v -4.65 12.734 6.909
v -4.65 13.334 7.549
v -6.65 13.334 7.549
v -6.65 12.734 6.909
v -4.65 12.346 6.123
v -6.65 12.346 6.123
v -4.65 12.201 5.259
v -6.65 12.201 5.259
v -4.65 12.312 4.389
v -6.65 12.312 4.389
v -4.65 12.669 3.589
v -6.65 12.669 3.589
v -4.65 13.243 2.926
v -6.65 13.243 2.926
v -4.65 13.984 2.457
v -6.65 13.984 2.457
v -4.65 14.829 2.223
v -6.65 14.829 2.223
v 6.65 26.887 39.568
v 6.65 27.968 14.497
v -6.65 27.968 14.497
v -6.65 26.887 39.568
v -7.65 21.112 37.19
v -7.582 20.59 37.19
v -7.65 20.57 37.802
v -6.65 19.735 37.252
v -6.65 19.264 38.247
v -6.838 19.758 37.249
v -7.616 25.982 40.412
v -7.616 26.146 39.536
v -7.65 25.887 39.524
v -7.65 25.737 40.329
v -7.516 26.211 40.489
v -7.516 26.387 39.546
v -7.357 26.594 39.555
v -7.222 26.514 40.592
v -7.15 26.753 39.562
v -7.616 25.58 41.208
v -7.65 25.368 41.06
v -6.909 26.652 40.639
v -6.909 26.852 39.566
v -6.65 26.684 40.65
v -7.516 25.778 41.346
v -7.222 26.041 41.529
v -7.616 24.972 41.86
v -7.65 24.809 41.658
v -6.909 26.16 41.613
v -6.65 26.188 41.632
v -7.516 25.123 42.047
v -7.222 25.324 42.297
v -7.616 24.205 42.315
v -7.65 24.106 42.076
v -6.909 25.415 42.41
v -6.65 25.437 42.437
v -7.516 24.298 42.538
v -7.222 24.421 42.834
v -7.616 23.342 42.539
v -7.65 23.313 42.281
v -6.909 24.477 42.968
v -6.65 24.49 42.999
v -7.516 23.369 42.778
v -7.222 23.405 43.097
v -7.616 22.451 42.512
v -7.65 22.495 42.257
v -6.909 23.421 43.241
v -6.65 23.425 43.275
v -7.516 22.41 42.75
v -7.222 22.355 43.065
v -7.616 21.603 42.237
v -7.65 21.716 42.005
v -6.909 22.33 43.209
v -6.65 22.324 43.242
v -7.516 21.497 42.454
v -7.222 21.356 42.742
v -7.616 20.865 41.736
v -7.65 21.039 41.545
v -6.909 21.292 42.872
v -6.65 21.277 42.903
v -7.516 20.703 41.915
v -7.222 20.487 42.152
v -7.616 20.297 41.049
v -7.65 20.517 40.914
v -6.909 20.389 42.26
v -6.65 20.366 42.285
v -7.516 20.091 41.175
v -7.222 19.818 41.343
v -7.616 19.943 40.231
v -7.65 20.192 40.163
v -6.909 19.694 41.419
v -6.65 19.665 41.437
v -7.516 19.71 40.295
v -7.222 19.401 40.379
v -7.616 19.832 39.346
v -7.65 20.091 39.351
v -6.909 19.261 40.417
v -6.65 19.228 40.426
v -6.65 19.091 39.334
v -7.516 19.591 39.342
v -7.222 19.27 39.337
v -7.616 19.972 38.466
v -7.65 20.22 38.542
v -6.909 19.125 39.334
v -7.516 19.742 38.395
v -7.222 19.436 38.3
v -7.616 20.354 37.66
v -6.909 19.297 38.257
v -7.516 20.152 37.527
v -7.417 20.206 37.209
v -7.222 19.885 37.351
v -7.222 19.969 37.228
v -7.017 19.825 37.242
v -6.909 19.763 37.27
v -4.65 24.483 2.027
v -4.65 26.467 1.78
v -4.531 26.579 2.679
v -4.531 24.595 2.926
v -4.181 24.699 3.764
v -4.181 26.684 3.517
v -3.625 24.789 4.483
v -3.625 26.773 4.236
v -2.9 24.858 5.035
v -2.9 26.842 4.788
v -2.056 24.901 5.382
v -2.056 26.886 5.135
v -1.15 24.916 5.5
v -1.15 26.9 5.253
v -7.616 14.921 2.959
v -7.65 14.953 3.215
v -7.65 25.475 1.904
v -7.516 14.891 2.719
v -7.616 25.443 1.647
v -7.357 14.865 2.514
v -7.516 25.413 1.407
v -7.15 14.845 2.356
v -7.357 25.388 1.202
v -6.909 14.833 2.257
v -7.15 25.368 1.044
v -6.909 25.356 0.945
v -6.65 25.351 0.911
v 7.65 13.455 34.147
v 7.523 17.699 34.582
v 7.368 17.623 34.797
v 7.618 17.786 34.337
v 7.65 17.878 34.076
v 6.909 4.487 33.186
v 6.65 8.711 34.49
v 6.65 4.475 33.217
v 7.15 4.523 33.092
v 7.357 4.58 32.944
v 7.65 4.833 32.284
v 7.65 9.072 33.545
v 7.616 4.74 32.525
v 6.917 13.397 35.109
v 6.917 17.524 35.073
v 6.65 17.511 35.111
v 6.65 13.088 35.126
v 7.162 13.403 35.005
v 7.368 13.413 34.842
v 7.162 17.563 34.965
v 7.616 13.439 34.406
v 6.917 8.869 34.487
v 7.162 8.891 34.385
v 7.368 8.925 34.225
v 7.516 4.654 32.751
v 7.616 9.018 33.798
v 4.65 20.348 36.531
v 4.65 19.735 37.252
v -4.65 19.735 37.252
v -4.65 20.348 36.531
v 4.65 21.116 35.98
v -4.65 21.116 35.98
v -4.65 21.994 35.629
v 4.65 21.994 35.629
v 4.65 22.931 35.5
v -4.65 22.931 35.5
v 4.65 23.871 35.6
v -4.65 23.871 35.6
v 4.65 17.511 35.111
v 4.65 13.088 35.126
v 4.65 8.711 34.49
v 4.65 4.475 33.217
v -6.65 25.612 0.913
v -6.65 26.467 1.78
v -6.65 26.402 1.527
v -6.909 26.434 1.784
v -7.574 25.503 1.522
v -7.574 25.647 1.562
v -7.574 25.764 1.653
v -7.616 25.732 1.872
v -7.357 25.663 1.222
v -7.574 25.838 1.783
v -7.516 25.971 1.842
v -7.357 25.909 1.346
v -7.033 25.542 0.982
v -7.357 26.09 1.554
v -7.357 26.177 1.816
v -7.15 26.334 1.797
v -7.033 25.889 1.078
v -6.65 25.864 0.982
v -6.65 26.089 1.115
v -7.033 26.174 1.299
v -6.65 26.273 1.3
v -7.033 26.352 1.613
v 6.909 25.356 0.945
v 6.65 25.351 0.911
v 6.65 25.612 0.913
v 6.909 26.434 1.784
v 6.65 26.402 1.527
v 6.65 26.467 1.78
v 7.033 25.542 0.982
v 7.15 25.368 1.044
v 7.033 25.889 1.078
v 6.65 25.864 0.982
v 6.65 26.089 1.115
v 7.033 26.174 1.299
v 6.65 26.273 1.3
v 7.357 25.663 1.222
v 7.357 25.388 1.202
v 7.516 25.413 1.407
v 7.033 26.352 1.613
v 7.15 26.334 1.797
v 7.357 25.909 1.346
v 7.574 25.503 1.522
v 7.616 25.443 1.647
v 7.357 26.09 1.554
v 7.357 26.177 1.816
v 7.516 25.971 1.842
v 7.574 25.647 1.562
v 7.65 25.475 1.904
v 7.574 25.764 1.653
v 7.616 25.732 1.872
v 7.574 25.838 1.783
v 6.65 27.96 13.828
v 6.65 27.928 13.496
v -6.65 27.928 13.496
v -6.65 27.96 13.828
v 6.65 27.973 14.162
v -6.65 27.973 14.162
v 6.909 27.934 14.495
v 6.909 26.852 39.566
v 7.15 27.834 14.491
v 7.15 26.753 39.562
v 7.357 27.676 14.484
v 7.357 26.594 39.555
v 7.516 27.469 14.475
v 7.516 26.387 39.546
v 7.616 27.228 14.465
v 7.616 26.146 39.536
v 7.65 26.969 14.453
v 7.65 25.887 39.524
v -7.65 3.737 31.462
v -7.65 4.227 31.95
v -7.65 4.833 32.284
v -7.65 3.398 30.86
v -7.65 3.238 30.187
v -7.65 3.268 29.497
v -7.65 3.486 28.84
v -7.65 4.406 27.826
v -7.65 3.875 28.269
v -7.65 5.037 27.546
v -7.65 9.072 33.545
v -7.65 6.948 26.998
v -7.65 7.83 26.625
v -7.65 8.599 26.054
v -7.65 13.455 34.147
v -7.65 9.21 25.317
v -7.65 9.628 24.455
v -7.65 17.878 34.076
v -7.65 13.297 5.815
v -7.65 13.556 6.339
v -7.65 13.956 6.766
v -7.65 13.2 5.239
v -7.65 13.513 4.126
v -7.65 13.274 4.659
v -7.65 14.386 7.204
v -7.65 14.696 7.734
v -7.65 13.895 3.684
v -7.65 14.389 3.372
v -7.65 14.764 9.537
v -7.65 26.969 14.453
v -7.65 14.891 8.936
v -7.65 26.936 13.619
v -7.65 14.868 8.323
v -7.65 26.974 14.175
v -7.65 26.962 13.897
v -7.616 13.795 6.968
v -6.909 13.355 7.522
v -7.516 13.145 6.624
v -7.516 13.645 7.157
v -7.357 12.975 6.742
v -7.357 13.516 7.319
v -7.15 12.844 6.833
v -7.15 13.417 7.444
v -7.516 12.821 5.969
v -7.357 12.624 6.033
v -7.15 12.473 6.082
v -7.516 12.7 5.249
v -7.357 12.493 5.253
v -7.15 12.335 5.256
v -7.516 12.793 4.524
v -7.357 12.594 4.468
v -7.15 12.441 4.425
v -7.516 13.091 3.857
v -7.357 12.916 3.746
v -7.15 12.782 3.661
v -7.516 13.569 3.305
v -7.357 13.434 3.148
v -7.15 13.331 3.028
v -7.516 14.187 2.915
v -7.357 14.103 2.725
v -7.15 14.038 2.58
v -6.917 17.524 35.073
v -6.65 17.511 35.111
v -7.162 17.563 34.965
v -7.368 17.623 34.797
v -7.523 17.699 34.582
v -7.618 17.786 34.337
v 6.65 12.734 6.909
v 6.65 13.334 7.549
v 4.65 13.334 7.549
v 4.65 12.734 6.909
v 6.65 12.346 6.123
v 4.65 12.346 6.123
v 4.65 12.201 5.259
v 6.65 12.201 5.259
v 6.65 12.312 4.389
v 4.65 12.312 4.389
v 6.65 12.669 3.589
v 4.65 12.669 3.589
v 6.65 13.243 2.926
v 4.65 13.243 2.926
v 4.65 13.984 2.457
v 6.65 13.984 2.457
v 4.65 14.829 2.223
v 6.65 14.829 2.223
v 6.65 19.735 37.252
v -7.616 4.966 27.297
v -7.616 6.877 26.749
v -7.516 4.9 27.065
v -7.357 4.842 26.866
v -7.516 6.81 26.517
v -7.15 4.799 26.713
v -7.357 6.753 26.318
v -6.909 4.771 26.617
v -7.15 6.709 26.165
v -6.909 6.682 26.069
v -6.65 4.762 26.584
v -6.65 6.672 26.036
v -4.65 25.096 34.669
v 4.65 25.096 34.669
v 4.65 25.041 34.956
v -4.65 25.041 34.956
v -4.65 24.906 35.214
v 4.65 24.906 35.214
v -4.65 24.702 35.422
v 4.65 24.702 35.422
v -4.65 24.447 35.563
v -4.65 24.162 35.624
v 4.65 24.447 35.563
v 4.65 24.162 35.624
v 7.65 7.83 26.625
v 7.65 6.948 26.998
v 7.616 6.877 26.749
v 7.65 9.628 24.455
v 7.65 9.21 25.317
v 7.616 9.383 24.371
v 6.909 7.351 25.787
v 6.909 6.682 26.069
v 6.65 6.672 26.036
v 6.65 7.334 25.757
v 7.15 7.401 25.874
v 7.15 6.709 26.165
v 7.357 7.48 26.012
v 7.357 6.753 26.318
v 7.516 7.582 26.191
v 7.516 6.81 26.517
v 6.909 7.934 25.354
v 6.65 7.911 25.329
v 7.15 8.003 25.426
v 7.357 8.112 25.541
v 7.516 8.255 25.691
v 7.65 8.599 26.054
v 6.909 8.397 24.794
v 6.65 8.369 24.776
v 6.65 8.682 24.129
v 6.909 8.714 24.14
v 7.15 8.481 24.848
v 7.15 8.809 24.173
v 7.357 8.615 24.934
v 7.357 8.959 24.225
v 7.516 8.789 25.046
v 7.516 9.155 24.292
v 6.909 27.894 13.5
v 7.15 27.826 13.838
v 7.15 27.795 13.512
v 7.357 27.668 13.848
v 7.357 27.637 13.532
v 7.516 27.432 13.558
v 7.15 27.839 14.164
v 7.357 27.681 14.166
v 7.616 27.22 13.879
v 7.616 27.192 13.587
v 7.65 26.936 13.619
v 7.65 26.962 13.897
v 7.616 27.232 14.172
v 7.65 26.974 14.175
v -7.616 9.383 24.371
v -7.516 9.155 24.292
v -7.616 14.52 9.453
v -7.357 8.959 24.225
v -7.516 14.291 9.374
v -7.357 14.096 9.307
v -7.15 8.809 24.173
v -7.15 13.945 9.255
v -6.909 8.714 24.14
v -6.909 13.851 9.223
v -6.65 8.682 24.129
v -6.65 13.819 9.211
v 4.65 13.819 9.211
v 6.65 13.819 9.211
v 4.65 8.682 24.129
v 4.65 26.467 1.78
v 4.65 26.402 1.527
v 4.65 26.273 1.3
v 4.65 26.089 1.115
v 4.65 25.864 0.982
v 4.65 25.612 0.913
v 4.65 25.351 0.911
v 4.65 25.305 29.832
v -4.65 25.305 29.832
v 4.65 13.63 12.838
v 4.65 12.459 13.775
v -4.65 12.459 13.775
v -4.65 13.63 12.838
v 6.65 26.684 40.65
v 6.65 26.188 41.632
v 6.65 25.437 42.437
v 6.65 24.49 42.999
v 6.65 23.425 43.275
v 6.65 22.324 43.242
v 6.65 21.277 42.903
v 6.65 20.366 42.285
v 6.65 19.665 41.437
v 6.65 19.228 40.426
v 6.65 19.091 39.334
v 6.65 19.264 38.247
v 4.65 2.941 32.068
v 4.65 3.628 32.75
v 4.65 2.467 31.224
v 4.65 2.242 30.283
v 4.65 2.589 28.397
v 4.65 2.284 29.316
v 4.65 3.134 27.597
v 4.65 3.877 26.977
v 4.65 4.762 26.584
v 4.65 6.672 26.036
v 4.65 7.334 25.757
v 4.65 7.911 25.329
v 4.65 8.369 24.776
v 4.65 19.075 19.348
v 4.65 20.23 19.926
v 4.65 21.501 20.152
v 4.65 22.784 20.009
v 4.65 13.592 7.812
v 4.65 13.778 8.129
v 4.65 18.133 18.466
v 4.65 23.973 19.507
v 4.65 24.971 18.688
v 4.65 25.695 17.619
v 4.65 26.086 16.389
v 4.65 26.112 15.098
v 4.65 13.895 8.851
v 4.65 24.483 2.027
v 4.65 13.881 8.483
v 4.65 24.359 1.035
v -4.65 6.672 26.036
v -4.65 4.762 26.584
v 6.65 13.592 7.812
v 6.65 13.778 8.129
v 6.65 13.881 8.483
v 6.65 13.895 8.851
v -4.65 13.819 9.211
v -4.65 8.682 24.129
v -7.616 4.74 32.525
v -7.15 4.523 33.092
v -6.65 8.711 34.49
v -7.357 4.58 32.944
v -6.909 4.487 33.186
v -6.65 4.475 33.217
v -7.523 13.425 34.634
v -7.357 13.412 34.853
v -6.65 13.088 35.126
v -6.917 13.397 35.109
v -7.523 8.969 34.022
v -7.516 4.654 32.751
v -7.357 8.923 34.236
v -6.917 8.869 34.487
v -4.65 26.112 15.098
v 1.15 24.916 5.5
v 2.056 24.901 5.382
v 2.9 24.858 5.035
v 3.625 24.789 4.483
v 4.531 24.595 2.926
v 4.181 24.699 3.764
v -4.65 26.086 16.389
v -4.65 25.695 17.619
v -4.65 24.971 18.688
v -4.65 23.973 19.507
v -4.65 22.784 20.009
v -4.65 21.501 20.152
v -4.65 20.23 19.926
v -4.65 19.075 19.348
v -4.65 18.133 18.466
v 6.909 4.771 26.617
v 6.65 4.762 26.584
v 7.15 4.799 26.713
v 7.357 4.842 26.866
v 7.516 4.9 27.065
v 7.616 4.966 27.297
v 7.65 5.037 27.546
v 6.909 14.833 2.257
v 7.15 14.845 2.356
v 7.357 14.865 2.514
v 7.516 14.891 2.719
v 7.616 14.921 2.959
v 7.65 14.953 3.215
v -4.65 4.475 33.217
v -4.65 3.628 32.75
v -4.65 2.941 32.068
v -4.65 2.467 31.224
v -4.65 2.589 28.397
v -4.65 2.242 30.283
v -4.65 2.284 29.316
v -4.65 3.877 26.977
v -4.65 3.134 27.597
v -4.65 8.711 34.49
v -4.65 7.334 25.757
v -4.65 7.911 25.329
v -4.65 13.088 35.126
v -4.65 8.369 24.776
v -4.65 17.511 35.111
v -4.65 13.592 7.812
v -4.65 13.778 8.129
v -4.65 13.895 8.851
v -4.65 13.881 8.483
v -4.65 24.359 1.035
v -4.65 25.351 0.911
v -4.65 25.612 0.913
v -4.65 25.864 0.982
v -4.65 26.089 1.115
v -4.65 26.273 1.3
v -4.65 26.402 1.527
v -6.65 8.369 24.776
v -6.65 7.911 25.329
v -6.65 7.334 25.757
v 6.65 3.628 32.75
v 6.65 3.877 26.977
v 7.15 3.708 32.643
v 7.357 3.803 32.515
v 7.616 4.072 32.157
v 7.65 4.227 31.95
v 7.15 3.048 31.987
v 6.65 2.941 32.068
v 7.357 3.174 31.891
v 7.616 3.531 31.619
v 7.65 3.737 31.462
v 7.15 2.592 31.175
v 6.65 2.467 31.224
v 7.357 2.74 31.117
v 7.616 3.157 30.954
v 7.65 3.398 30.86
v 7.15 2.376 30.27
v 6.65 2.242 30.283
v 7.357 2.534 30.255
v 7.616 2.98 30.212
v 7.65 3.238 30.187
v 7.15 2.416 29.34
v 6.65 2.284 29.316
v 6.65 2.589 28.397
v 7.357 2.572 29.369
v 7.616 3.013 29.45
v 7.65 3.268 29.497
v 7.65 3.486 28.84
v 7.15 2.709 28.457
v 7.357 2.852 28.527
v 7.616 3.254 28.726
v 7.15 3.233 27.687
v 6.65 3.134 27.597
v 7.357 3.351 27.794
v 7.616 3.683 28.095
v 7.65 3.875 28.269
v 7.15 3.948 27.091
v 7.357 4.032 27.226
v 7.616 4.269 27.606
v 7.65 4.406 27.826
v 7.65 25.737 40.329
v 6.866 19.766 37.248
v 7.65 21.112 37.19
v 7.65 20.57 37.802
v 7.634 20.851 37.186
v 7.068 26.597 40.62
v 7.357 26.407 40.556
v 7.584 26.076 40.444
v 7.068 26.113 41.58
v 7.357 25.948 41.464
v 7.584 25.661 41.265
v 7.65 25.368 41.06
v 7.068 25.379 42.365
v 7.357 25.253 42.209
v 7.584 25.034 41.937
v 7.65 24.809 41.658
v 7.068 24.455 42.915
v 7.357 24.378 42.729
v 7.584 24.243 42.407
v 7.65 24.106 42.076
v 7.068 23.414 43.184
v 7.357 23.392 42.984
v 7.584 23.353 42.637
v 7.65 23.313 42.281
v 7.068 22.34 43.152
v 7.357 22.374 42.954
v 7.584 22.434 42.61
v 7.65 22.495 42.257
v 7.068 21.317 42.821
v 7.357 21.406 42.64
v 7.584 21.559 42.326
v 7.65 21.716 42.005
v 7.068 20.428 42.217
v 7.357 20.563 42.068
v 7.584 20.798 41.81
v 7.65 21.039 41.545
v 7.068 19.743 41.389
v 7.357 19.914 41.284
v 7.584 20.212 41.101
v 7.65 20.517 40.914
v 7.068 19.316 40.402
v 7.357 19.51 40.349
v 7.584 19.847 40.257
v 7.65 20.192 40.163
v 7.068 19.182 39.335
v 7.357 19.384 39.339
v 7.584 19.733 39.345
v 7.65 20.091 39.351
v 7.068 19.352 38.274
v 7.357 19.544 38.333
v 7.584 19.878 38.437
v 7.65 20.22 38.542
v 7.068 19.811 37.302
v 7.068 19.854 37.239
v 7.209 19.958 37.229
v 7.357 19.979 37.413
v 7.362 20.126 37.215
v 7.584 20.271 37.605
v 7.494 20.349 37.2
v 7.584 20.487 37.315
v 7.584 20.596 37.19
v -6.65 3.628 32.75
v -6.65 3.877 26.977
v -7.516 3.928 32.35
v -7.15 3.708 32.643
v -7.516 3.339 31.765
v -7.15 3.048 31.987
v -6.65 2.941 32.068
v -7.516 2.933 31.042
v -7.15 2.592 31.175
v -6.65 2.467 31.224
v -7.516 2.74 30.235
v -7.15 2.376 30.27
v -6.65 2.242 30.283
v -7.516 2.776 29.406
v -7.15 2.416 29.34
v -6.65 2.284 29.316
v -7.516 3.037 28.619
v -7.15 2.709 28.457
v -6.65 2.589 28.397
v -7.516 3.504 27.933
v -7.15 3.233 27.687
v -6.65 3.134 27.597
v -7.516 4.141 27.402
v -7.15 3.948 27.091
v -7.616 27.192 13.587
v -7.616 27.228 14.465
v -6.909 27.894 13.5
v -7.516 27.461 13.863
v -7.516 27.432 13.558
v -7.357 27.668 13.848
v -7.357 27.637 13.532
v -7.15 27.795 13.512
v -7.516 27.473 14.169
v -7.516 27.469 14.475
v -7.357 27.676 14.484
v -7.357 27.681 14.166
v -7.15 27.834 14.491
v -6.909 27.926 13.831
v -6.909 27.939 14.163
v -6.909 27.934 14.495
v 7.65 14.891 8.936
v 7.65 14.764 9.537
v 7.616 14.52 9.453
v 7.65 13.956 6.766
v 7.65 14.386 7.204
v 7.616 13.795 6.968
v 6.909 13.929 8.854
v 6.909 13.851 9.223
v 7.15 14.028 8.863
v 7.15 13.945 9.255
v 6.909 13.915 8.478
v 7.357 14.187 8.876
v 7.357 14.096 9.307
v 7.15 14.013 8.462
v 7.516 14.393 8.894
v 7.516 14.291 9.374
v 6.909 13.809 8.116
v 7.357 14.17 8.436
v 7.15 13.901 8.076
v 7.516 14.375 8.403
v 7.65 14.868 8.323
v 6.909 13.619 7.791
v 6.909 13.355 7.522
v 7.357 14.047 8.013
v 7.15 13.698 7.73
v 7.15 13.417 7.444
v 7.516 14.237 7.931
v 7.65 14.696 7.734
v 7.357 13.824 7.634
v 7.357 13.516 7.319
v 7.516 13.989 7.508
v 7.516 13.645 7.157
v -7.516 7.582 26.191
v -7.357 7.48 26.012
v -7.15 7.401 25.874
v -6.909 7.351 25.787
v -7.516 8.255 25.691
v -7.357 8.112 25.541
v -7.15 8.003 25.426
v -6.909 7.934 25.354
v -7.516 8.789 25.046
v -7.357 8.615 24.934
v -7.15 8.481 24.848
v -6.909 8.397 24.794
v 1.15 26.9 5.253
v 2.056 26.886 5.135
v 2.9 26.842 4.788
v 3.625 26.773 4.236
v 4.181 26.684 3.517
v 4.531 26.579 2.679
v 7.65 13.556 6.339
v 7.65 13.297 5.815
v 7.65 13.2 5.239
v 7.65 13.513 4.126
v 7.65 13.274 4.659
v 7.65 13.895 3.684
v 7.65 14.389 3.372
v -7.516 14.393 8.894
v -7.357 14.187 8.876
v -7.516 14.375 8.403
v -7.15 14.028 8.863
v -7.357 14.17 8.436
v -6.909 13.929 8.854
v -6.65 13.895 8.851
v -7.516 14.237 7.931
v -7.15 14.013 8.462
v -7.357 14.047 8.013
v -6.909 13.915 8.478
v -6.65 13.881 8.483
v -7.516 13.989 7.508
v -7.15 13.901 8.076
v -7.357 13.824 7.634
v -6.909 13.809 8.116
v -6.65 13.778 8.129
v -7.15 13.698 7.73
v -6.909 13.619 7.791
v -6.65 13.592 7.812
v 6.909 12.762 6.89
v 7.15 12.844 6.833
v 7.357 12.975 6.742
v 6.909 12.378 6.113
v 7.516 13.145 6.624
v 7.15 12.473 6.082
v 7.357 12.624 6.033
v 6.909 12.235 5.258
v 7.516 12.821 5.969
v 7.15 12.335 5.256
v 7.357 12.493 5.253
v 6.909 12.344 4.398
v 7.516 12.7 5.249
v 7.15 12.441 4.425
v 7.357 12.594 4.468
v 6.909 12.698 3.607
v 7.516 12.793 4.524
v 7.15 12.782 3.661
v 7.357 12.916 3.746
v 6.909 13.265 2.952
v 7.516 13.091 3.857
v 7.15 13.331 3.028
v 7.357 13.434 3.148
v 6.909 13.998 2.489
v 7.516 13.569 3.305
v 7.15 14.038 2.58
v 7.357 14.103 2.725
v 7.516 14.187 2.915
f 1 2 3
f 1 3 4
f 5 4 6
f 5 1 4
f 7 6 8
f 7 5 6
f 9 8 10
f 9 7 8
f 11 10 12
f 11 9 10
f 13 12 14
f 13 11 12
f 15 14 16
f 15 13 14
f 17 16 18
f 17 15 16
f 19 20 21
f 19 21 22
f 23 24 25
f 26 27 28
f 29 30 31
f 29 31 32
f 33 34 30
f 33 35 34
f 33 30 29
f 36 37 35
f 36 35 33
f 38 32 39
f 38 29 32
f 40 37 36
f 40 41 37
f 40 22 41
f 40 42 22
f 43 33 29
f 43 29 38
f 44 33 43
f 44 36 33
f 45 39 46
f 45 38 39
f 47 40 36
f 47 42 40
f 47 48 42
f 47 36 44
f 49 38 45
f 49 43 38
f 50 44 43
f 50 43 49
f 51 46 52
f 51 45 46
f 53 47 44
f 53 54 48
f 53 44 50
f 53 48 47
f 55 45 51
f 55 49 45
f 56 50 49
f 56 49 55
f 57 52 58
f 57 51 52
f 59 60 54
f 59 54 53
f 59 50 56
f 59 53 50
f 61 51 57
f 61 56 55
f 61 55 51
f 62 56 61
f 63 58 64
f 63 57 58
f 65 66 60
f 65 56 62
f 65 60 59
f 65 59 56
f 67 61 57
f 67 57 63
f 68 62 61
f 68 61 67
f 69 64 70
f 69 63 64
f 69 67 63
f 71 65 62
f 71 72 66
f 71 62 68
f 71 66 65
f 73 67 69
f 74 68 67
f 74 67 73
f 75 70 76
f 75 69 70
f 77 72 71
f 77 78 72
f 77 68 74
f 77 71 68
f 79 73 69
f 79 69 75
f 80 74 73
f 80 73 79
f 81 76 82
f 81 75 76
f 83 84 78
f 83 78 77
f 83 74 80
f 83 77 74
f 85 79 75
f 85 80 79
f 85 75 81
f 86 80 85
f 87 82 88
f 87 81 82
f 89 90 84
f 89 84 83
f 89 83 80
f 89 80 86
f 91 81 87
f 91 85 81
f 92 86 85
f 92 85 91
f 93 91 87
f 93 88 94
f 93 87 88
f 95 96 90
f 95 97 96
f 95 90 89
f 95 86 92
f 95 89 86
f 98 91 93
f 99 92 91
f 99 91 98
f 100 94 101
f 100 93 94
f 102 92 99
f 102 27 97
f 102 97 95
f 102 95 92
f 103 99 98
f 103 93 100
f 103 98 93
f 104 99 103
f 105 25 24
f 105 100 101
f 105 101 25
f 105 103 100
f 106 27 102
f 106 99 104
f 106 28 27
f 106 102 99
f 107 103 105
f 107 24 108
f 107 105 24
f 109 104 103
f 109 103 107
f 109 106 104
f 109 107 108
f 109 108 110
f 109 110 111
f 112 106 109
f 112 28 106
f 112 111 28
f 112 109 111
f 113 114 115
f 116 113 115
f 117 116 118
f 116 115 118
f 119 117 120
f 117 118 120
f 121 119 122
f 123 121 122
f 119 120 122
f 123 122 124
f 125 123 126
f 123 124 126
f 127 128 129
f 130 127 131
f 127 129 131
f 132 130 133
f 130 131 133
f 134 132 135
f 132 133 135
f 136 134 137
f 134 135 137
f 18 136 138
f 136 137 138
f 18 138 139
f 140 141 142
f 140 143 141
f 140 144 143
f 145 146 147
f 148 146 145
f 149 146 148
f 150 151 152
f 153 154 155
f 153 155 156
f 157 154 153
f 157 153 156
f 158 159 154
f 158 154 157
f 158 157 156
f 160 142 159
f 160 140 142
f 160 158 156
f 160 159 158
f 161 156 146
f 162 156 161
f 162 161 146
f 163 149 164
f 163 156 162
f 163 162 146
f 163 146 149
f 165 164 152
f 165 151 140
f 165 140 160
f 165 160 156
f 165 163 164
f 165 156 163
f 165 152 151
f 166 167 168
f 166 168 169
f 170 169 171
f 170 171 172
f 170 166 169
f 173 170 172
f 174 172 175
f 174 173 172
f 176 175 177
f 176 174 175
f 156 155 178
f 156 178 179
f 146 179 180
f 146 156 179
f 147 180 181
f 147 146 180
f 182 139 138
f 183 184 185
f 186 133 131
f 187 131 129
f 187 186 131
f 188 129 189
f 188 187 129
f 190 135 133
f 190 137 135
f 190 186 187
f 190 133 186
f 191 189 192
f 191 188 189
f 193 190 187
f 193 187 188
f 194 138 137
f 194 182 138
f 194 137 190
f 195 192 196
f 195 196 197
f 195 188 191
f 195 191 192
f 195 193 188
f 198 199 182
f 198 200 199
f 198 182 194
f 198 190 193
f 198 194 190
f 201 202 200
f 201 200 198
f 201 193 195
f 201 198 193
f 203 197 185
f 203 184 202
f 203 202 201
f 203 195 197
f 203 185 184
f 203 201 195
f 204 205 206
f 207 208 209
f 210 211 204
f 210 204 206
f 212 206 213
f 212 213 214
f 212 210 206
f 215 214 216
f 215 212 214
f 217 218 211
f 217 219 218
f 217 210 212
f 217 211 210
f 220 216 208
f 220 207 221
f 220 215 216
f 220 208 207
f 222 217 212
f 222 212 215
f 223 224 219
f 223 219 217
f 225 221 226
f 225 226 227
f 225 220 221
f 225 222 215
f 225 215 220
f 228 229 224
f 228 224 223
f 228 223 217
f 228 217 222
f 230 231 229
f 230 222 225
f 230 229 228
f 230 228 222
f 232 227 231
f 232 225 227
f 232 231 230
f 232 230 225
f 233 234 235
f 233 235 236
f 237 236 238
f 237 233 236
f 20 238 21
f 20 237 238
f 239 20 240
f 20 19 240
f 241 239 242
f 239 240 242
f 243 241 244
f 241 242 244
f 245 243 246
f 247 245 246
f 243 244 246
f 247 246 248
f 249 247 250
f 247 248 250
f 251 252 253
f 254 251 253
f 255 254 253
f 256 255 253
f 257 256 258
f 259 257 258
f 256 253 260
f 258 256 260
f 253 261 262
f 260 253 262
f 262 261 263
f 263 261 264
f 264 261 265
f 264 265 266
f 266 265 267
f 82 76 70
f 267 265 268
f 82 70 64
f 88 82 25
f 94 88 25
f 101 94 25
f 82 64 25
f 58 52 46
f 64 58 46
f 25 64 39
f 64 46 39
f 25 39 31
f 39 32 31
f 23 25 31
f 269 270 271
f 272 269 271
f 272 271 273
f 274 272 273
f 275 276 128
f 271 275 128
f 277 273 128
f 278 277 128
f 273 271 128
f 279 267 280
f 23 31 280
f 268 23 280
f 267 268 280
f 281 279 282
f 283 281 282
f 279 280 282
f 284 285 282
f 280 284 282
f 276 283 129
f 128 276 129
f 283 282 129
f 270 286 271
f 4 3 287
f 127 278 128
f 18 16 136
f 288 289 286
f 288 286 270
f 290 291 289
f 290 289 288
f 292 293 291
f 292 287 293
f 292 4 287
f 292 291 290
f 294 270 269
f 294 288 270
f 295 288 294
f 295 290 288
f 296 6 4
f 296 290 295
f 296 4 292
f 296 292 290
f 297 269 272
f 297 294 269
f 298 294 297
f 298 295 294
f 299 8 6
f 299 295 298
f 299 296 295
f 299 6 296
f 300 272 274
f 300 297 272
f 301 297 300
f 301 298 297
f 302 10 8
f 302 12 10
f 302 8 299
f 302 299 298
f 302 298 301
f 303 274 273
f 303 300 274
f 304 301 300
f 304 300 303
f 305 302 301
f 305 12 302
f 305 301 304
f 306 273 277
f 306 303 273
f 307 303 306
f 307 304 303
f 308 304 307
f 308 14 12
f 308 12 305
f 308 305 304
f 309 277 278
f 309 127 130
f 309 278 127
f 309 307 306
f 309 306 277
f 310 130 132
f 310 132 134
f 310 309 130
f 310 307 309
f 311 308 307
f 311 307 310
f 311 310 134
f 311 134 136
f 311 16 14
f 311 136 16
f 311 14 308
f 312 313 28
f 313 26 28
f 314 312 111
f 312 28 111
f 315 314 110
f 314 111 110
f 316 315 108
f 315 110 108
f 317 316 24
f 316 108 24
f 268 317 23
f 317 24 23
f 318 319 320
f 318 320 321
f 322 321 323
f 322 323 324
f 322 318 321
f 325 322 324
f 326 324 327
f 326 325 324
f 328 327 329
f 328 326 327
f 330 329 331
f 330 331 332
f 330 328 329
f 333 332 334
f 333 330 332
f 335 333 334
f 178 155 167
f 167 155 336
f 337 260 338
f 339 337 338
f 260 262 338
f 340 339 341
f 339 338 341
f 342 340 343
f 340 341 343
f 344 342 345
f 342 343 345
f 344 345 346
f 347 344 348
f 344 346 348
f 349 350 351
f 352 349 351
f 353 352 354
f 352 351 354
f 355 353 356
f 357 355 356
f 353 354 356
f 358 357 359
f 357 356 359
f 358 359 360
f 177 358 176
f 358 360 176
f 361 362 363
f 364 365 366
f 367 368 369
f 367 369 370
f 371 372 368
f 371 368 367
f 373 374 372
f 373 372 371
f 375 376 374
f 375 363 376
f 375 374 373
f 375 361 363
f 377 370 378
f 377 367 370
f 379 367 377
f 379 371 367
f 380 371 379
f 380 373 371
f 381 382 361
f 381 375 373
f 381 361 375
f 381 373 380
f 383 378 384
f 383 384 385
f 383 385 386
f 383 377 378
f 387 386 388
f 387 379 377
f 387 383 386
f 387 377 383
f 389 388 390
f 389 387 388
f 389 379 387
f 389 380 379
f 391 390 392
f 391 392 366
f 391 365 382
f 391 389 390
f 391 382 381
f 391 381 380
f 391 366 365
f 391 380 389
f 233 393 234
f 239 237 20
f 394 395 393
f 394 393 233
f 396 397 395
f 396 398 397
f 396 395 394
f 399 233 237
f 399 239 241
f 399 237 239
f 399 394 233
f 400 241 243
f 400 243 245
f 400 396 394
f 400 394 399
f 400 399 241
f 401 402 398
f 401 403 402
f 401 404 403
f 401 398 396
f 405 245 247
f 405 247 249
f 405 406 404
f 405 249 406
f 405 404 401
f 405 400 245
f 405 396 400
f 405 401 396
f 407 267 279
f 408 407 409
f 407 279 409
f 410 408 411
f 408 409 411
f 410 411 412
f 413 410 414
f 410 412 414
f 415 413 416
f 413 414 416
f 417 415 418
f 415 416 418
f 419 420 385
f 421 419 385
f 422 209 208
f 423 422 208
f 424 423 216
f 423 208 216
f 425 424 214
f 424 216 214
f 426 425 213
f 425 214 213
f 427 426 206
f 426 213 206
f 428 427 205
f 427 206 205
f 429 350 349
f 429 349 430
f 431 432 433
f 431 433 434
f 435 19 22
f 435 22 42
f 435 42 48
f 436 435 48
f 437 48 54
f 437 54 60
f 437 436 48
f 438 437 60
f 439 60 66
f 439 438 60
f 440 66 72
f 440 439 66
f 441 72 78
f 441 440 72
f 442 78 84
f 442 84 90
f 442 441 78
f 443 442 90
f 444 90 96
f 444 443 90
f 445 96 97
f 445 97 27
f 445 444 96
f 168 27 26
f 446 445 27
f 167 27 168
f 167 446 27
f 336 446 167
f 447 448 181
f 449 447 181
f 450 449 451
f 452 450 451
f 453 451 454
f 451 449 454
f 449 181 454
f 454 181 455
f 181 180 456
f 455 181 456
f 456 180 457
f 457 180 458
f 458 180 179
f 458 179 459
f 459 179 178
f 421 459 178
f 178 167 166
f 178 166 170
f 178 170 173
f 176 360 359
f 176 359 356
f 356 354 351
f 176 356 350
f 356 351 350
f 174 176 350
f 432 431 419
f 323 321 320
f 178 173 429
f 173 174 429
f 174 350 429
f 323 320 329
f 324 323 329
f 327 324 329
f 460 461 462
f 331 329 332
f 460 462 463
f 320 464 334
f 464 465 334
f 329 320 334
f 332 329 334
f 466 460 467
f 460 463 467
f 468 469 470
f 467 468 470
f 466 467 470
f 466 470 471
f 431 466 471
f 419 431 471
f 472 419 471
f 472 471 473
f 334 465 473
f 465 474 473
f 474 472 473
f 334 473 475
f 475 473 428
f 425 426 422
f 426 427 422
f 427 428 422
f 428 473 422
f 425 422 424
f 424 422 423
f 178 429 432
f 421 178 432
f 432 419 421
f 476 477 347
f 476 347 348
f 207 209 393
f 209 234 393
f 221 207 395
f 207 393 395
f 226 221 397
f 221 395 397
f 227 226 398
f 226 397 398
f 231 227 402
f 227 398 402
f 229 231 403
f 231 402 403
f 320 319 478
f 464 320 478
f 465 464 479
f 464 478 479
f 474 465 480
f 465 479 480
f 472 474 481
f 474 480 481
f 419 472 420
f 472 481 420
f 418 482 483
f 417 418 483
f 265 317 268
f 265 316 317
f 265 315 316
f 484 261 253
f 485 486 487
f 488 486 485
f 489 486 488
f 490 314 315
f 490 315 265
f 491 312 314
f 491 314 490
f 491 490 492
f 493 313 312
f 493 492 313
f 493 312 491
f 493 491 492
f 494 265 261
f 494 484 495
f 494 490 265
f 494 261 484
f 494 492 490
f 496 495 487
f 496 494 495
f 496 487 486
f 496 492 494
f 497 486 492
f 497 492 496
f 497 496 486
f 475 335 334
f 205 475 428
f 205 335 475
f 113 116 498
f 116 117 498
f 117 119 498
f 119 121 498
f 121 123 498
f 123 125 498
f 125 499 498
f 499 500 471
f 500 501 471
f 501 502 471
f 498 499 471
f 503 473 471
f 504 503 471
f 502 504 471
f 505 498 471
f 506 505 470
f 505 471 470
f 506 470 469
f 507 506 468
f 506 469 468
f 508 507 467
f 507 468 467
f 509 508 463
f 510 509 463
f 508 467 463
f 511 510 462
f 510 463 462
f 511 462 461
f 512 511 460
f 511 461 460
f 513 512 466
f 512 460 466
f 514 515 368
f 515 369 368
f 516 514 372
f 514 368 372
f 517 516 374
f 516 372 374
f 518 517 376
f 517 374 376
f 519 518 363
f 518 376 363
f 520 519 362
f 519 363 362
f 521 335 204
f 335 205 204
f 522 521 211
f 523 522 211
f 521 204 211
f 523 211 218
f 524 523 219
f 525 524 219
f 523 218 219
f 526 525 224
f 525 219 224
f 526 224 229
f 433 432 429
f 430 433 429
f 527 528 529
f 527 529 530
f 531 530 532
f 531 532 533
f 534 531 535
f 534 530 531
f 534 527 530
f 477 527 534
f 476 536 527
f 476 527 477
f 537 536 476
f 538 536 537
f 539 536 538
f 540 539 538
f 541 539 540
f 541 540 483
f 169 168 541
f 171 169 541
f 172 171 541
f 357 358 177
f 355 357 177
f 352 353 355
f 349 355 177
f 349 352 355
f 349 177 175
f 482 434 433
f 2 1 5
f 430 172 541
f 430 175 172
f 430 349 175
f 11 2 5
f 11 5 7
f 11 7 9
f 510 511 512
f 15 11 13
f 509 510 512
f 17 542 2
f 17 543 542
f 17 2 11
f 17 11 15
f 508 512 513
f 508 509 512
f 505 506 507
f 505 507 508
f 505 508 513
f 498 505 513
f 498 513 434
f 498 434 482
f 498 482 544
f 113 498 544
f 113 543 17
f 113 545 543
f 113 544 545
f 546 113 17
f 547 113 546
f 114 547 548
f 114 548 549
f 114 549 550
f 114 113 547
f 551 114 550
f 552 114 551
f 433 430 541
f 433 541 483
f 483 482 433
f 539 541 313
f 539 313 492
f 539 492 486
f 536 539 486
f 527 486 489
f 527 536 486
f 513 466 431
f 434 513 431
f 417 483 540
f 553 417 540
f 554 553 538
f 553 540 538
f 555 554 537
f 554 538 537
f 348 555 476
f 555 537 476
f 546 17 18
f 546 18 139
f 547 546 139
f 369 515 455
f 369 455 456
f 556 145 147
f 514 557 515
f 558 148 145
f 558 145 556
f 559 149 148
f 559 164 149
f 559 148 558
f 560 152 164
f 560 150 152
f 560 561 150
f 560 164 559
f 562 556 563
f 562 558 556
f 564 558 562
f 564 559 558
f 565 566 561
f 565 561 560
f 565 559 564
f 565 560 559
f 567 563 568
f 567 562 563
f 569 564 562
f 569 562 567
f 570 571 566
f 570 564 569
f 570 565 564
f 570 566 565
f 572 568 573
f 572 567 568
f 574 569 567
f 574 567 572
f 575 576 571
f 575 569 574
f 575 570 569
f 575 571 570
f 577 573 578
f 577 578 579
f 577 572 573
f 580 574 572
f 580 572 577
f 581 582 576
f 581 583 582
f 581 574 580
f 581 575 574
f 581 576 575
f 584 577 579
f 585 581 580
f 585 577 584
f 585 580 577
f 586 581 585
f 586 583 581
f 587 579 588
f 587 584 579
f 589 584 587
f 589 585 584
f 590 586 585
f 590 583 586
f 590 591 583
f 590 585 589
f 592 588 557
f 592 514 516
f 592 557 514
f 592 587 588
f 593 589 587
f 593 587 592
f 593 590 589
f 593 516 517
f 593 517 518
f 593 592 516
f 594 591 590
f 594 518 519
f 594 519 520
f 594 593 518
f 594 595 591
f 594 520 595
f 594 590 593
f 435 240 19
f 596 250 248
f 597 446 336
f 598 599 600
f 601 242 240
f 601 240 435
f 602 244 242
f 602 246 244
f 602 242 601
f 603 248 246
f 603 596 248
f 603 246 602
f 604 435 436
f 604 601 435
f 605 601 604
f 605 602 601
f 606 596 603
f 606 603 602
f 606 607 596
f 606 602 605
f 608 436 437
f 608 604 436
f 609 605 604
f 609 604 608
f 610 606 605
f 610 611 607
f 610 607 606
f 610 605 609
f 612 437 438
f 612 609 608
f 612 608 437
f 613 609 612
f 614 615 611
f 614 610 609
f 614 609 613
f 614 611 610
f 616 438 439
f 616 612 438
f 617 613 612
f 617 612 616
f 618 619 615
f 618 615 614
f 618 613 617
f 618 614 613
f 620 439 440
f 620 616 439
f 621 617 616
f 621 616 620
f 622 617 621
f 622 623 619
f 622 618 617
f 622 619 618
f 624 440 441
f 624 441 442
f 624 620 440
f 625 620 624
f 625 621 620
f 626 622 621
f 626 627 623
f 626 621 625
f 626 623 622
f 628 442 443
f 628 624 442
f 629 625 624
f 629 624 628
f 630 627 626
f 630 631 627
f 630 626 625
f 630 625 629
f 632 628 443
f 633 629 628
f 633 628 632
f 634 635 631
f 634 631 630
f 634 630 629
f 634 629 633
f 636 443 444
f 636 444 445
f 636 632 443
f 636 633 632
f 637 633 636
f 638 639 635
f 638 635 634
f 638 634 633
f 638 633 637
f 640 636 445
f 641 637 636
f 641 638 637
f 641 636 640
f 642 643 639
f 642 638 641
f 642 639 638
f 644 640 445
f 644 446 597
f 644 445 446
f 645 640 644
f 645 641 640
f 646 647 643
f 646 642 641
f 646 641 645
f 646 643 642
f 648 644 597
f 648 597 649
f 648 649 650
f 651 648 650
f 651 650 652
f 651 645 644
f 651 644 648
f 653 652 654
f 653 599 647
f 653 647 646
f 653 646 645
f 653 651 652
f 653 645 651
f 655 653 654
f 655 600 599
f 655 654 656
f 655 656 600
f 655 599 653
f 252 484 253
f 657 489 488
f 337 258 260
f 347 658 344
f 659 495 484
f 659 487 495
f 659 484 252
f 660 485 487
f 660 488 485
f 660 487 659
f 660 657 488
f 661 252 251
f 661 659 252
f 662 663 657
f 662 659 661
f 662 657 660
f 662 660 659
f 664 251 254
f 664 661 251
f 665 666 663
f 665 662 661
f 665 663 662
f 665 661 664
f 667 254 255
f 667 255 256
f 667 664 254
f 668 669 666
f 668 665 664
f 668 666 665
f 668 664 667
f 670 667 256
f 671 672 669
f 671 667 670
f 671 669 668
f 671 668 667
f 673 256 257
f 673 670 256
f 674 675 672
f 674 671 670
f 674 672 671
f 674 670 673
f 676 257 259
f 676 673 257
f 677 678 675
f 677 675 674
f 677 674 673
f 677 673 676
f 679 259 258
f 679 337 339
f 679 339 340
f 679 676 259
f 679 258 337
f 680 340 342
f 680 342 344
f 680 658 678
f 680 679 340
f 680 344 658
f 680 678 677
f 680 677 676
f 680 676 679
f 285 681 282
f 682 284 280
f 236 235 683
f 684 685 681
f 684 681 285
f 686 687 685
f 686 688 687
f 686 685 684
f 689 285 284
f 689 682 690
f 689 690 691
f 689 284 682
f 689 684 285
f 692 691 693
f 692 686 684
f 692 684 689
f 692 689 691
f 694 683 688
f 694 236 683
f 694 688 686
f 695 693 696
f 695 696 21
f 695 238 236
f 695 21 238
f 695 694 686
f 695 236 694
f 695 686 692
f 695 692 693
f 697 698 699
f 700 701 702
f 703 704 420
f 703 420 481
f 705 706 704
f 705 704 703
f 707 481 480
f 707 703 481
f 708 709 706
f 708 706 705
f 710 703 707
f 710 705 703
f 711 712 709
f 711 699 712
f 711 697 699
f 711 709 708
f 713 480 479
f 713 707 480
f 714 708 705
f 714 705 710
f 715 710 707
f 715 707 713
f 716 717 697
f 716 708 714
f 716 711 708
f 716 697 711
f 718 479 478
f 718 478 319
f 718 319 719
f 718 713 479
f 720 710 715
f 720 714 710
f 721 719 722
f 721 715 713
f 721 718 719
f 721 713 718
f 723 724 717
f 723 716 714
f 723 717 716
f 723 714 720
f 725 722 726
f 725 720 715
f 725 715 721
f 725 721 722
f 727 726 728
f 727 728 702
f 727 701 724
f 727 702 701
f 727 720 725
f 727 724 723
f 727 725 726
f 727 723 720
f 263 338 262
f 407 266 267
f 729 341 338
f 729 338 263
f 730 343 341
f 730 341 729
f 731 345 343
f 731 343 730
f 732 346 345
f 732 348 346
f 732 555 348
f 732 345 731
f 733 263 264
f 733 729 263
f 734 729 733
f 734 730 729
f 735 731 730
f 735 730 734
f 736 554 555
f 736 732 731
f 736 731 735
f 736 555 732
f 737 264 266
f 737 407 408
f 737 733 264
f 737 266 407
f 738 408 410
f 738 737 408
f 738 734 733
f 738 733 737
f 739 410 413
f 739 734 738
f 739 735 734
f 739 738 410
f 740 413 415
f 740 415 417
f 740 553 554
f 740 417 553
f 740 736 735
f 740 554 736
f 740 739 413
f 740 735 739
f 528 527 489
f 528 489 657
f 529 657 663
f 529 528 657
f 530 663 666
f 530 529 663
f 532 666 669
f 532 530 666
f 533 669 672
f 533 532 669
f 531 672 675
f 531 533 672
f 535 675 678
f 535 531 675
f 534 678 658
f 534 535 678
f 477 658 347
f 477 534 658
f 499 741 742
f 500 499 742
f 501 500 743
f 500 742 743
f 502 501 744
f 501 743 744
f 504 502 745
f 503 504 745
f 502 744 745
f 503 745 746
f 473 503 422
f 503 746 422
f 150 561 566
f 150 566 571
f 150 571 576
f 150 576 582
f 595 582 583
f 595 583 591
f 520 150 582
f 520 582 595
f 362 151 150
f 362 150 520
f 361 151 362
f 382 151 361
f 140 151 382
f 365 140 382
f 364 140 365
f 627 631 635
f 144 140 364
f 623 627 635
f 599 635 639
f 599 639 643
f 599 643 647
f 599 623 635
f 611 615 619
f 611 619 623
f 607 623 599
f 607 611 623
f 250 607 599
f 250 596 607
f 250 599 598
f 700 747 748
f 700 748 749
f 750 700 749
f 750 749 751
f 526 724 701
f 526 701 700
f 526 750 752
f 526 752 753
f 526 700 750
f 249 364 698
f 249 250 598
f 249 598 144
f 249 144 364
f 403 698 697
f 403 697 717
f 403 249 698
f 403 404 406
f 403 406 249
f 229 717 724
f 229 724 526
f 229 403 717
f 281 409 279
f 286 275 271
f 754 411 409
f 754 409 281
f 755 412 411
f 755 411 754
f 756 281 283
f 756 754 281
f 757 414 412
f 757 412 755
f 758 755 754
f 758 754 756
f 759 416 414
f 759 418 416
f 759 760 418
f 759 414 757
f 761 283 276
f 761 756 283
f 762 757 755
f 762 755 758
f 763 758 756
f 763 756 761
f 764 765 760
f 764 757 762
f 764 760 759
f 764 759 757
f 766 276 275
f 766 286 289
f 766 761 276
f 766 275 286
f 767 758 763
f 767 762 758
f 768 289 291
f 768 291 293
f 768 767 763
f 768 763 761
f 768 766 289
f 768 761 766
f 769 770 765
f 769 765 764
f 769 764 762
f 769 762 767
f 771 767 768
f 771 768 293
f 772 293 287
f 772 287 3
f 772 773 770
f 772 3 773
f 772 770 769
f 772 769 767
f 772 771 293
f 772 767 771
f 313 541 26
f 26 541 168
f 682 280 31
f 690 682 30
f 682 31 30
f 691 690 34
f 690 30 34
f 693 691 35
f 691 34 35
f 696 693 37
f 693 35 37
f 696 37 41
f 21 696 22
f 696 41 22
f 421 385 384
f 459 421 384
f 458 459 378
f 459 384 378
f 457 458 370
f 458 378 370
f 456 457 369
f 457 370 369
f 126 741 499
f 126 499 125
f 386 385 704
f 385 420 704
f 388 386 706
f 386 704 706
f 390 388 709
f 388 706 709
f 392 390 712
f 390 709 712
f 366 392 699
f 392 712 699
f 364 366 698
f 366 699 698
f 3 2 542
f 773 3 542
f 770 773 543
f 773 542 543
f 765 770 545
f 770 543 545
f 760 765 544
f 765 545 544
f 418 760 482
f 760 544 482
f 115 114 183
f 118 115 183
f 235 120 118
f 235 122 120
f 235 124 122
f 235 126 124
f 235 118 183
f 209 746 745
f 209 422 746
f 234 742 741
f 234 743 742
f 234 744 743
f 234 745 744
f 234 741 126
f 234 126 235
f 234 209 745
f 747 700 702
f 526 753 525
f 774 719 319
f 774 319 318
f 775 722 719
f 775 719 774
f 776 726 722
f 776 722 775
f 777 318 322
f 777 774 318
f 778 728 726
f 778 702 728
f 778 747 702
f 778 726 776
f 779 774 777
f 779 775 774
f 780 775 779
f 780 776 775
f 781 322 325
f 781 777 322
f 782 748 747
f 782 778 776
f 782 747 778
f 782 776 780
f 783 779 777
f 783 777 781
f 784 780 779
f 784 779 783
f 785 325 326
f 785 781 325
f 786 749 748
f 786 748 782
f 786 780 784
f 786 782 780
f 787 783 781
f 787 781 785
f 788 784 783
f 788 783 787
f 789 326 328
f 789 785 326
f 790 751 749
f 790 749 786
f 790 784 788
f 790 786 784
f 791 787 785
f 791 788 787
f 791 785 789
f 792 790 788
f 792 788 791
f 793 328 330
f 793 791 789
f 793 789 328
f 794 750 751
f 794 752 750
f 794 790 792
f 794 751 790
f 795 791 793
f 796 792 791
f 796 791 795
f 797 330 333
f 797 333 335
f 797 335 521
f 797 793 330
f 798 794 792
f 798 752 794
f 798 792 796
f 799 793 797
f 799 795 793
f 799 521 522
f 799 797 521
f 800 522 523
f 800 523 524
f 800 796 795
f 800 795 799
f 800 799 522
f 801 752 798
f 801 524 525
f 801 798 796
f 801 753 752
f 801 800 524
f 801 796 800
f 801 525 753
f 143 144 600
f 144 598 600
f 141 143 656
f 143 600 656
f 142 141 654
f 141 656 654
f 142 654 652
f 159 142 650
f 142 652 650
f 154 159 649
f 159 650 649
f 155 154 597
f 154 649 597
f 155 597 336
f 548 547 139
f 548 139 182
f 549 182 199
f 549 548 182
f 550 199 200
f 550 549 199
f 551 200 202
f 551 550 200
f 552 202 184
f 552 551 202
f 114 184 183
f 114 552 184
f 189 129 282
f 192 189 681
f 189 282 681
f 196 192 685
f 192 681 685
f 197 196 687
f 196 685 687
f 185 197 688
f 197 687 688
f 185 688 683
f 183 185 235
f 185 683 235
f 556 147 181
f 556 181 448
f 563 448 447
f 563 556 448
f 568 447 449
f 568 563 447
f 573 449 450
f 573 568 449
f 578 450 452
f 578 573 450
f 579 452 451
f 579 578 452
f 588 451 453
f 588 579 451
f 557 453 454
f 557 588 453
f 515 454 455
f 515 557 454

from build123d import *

# Parameters (mm, degrees)
PAD004_DEPTH            = 7.65
POCKET003_DEPTH         = 4.65
POCKET004_DEPTH         = 2
FILLET007_R             = 1
FILLET008_R             = 1
BODY003_PLACEMENT_ANGLE = 289


with BuildPart() as part:
    # Sketch009 → Pad004 (new body, symmetric)
    with BuildSketch(Plane.YZ):
        with BuildLine():
            ThreePointArc((-2.8284271247, -1), (-0.1735950846, -2.9949732464), (2.6939497909, -1.3200888318))
            Line((2.6939497909, -1.3200888318), (7.8, 9.1))
            Line((7.8, 9.1), (-3.7, 14.7352281014))
            ThreePointArc((-3.7, 14.7352281014), (-4.158961759, 14.9368094594), (-4.6331484619, 15.0993760945))
            Line((-4.6331484619, 15.0993760945), (-28.6904310189, 22.2388309237))
            ThreePointArc((-28.6904310189, 22.2388309237), (-33.6993372116, 18.5718979166), (-28.8290152057, 14.7228067922))
            Line((-27.5290152057, 11.9228067922), (-28.8290152057, 14.7228067922))
            ThreePointArc((-27.5290152057, 11.9228067922), (-29.4749197629, 5.5883007232), (-29.9826934773, -1.0188679245))
            ThreePointArc((-29.9826934773, -1.0188679245), (-27.4803397166, -4.255402597), (-23.6176804166, -2.9075175272))
            Line((-23.6176804166, -2.9075175272), (-22.4775697078, -1.2792706909))
            ThreePointArc((-20.0201135749, 0), (-21.4053594146, -0.3389675005), (-22.4775697078, -1.2792706909))
            Line((-4.2426406871, 0), (-20.0201135749, 0))
            ThreePointArc((-2.8284271247, -1), (-3.3766152833, -0.2752551286), (-4.2426406871, 0))
        make_face()
    extrude(amount=PAD004_DEPTH, both=True)

    # Sketch010 → Pocket003 (cut, symmetric)
    with BuildSketch(Plane.YZ):
        with BuildLine():
            Line((6.9199407788, 7.3040334727), (-5.8060355253, 13.5400142802))
            ThreePointArc((-5.8060355253, 13.5400142802), (-11.1364622888, 12.5033421393), (-11.5881769744, 7.0918642957))
            Line((-11.5881769744, 7.0918642957), (-7.7326639328, 1.0024084327))
            Line((-9, 0.2), (-7.7326639328, 1.0024084327))
            Line((-9, 0.2), (-20, 17.5735670895))
            Line((-24.6418524264, 18.9511248267), (-20, 17.5735670895))
            ThreePointArc((-24.6418524264, 18.9511248267), (-25.4821110434, 18.8237971917), (-25.9209782539, 18.0960318164))
            ThreePointArc((-28.8290152057, 14.7228067922), (-26.8461376765, 15.9534931036), (-25.9209782539, 18.0960318164))
            Line((-28.8290152057, 14.7228067922), (-34.6400816793, 13.2289840317))
            Line((-34.6400816793, 13.2289840317), (-31.0800592212, -4.6959665273))
            Line((-31.0800592212, -4.6959665273), (6.9199407788, -4.6959665273))
            Line((6.9199407788, -4.6959665273), (6.9199407788, 7.3040334727))
        make_face()
    extrude(amount=POCKET003_DEPTH, both=True, mode=Mode.SUBTRACT)

    # Sketch011 (on Face6 of Pocket003) → Pocket004 (cut)
    with BuildSketch(Plane(origin=(0, 5.1060502091, 10.4200888318), x_dir=(0, -0.8979832636, 0.4400296106), z_dir=(0, 0.4400296106, 0.8979832636))):
        with BuildLine():
            Line((-3, 4.65), (-2, 4.65))
            ThreePointArc((1.5, 1.15), (0.4748737342, 3.6248737342), (-2, 4.65))
            Line((1.5, 1.15), (1.5, -1.15))
            ThreePointArc((-2, -4.65), (0.4748737342, -3.6248737342), (1.5, -1.15))
            Line((-2, -4.65), (-3, -4.65))
            Line((-3, -4.65), (-3, 4.65))
        make_face()
    extrude(amount=-POCKET004_DEPTH, mode=Mode.SUBTRACT)

    # Fillet007
    fillet007_edges = [part.edges().sort_by_distance(p)[0] for p in [
        (-6.15, 7.8, 9.1),
        (6.15, 7.8, 9.1),
    ]]
    fillet(fillet007_edges, radius=FILLET007_R)

    # Fillet008
    fillet008_edges = [part.edges().sort_by_distance(p)[0] for p in [
        (7.65, -16.66179, 18.669104),
        (-7.65, -16.66179, 18.669104),
        (-7.65, -28.179015, 13.322807),
        (7.65, -28.179015, 13.322807),
    ]]
    fillet(fillet008_edges, radius=FILLET008_R)


with BuildPart() as part_1:
    # Body003 placement: moved
    add(part.part.moved(Location((0, 15.2, 5.2))).rotate(Axis((0, 15.2, 5.2), (1, 0, 0)), BODY003_PLACEMENT_ANGLE))


solid = part_1.part
